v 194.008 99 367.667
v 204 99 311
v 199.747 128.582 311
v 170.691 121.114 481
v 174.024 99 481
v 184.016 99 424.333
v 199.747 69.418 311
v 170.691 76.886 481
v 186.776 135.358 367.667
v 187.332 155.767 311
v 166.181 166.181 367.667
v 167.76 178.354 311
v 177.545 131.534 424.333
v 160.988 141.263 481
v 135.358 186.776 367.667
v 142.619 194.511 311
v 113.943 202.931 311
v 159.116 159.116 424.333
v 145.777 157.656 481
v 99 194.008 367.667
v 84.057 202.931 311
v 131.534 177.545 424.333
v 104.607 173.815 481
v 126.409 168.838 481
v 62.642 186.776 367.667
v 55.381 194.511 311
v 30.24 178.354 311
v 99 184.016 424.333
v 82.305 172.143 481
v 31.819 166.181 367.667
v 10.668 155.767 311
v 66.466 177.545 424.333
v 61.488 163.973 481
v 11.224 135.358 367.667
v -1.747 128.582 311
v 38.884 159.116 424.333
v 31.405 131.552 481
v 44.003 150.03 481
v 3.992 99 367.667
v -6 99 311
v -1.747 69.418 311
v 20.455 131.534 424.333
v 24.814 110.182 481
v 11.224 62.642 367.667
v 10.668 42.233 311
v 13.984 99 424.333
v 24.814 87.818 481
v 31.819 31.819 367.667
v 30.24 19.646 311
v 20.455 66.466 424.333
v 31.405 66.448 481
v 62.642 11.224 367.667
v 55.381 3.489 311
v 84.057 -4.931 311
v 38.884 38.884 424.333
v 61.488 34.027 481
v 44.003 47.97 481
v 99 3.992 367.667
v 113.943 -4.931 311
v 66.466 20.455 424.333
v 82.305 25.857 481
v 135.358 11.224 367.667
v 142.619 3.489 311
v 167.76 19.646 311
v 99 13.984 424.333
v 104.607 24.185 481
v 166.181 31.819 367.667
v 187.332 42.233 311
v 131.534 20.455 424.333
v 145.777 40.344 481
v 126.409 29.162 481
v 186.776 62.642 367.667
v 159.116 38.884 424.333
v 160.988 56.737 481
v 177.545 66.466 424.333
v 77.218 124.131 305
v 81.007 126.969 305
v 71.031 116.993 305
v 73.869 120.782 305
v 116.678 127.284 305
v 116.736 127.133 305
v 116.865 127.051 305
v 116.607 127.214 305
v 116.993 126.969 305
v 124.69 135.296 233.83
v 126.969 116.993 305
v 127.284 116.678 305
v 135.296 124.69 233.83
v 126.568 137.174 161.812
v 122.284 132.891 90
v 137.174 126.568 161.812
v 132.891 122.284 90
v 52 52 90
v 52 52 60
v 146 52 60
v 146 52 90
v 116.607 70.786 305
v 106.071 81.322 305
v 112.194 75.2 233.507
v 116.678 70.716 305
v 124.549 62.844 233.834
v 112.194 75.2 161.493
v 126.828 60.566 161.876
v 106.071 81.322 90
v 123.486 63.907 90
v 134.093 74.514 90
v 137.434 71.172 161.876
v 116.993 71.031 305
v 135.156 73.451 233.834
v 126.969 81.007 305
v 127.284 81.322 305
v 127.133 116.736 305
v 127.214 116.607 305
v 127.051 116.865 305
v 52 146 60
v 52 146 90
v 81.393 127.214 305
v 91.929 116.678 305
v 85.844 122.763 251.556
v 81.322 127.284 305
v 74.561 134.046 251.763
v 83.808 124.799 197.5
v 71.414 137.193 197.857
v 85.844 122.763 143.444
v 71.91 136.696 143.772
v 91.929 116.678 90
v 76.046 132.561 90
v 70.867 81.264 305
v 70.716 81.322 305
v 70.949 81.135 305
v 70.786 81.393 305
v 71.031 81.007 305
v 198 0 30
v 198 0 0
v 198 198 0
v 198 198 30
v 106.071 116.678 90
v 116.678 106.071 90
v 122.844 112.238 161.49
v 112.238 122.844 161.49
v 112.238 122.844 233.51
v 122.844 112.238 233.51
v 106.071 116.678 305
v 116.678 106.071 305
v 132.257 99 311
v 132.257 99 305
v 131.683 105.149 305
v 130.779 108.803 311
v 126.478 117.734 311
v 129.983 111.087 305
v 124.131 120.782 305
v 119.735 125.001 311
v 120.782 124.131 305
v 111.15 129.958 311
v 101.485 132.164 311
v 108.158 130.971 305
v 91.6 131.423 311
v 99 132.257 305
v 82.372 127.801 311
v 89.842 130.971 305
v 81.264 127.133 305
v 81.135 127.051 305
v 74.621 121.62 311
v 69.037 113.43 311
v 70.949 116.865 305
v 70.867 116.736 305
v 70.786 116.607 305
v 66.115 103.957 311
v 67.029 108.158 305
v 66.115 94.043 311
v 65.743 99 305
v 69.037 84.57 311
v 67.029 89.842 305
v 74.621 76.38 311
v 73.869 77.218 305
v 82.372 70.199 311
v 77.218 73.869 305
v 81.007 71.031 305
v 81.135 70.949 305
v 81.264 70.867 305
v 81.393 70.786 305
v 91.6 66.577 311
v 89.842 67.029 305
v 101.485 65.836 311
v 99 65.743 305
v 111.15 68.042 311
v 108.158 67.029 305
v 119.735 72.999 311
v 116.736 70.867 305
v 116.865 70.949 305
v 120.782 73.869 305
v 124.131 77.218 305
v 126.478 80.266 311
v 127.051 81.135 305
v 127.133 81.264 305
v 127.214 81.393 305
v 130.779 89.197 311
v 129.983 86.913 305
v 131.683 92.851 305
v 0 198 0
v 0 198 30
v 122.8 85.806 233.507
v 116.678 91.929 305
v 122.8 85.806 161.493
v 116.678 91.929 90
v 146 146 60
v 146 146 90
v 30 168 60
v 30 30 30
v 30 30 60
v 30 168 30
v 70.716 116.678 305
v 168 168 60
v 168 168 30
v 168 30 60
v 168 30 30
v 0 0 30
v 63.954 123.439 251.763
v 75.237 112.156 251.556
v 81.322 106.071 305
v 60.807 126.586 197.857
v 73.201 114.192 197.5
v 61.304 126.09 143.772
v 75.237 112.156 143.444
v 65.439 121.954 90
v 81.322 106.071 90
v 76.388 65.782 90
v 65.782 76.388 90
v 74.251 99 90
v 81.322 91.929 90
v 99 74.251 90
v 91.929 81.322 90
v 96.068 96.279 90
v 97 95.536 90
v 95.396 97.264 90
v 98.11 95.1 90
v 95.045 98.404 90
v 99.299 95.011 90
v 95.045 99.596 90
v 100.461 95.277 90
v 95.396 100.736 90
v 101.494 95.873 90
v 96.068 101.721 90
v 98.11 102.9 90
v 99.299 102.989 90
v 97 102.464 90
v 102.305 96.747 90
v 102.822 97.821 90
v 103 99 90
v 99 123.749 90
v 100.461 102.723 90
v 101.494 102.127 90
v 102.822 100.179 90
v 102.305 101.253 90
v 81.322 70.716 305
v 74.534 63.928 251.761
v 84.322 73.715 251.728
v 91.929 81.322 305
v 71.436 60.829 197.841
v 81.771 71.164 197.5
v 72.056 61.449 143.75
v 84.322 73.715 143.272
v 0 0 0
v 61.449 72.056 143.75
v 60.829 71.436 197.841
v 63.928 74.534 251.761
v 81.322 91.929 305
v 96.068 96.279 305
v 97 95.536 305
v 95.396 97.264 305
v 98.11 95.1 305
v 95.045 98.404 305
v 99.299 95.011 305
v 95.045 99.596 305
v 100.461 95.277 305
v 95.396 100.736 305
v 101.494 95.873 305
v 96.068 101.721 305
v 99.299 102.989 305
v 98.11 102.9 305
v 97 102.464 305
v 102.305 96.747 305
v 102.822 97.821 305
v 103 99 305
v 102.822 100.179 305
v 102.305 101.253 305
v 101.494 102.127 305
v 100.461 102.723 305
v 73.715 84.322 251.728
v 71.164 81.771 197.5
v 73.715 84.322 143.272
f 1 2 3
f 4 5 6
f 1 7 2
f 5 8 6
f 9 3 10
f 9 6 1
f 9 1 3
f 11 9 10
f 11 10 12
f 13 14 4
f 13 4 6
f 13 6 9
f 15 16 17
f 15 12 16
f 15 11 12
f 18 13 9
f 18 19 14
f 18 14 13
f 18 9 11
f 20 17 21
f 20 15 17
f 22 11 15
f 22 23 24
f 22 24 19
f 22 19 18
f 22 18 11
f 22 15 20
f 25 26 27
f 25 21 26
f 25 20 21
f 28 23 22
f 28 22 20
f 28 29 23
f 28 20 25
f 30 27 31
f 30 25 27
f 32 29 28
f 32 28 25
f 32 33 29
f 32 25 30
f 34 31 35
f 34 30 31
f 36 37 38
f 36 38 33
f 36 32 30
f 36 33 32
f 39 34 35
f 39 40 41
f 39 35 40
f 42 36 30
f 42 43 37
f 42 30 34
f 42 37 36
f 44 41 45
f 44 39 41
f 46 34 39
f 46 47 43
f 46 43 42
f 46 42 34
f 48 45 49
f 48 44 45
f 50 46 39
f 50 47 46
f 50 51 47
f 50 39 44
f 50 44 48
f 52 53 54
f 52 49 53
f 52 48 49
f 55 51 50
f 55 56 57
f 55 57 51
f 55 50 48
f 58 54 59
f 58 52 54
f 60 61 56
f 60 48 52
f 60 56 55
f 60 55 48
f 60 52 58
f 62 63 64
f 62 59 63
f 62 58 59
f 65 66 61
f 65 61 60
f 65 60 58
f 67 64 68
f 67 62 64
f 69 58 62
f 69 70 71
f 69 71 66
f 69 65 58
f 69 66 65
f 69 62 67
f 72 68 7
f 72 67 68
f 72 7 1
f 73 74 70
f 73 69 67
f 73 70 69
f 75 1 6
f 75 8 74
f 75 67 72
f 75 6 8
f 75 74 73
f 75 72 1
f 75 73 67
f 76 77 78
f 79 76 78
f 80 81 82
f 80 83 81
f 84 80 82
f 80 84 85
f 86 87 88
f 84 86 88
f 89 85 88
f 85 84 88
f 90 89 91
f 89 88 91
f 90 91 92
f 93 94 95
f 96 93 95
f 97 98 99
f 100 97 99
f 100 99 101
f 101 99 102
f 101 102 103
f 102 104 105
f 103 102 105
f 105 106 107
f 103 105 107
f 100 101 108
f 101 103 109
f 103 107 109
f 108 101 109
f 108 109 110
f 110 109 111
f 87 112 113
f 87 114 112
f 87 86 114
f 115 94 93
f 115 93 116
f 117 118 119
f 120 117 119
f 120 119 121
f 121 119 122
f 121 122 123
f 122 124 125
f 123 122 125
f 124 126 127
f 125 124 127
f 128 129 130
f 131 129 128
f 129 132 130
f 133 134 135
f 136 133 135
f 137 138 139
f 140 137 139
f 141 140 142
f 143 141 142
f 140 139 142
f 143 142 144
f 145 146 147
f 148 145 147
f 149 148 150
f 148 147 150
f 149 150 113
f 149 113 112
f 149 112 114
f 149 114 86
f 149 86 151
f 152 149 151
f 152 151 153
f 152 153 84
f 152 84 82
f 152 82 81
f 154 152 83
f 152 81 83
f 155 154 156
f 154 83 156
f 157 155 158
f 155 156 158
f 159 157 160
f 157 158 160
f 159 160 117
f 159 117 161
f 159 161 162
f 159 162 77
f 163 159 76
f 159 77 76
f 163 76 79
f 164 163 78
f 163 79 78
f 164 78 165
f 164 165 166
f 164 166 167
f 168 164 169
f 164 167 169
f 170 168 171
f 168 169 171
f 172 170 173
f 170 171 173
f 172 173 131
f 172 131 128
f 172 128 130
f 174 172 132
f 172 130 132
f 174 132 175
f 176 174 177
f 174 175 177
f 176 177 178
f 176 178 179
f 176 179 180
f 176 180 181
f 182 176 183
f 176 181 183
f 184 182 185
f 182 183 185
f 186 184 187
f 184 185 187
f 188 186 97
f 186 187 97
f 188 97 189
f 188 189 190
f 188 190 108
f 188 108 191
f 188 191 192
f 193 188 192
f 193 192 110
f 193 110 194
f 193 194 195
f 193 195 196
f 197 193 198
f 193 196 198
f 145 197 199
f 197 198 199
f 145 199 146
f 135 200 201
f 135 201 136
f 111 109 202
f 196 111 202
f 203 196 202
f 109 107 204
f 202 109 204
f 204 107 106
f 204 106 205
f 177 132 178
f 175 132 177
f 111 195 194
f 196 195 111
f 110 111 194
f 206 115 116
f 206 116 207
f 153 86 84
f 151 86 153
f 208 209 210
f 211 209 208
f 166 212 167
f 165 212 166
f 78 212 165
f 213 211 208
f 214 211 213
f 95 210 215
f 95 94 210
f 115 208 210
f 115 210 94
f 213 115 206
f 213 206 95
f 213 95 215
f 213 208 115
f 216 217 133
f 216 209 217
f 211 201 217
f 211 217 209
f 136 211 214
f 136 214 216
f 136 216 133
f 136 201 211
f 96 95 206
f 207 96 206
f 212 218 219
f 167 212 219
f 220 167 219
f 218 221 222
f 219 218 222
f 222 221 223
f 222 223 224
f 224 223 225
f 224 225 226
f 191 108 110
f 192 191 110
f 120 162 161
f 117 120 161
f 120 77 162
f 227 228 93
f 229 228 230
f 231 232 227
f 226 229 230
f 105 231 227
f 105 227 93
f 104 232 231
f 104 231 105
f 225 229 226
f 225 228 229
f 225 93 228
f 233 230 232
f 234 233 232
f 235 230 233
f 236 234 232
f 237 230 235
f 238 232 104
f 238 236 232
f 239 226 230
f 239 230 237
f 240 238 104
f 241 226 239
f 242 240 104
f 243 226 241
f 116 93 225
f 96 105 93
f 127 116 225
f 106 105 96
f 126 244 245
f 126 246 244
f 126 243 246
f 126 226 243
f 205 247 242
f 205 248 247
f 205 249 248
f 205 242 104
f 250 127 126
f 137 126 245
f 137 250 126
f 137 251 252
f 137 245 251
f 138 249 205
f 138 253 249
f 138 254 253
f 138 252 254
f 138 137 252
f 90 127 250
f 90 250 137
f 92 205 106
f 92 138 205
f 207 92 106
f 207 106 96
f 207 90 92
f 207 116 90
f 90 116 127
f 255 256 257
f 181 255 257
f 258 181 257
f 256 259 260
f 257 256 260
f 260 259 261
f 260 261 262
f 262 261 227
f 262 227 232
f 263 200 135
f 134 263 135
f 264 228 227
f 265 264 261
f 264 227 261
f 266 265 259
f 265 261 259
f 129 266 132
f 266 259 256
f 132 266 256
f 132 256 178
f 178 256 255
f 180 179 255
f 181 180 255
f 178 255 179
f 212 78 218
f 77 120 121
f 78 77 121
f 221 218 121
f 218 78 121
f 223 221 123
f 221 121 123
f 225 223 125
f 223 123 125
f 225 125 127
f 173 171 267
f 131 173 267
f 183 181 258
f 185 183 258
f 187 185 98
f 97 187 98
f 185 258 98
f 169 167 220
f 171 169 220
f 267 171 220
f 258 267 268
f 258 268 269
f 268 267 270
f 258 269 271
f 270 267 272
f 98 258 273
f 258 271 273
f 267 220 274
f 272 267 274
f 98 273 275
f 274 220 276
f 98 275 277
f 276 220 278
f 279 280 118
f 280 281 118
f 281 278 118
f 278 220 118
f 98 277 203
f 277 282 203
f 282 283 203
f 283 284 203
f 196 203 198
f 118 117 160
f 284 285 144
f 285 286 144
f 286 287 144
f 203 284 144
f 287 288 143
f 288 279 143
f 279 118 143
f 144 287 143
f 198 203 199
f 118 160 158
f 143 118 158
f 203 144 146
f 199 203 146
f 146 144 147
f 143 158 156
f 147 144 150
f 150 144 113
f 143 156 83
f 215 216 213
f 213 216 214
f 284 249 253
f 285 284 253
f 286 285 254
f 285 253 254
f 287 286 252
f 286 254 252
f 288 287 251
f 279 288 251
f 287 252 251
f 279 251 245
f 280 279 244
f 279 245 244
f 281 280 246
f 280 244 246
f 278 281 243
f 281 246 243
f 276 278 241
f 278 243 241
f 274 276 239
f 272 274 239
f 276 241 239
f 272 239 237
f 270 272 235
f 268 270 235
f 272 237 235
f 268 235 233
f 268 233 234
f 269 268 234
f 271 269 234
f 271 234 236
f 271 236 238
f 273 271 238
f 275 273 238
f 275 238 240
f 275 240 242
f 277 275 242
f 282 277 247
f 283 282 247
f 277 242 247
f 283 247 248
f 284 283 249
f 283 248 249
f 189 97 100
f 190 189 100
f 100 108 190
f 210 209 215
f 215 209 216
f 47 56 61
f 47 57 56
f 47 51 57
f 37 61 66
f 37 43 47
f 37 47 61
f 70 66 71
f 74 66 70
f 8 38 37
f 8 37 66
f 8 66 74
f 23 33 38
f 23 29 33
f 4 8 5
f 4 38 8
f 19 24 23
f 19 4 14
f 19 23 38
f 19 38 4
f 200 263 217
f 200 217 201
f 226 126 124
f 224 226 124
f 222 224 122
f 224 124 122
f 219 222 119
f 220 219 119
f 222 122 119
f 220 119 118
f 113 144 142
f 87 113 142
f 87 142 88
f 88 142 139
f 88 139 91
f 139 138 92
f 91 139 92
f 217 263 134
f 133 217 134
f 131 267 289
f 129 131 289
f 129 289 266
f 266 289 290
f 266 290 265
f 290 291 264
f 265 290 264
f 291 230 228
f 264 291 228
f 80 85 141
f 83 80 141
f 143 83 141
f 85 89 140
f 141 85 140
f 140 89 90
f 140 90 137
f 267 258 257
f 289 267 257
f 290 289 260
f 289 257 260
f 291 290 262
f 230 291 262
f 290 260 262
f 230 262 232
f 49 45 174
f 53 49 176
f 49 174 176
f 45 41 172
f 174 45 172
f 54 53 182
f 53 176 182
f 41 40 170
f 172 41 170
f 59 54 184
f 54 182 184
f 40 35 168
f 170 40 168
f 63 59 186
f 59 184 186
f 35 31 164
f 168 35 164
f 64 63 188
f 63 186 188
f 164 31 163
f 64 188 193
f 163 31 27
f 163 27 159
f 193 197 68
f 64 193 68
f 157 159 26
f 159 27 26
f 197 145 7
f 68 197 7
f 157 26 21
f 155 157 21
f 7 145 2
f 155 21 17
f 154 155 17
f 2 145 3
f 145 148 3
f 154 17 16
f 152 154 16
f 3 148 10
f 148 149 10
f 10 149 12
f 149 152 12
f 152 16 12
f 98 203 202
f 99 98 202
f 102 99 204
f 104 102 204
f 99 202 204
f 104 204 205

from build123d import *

# Parameters (mm, degrees)
F0_W      = 198
F0_H      = 198
F1_DEPTH  = 30
F2_W      = 138
F2_H      = 138
F3_DEPTH  = 30
F4_W      = 94
F4_H      = 94
F5_DEPTH  = 30
F6_R      = 4
F7_DEPTH  = 215
F9_DEPTH  = 215
F11_DEPTH = 25
F13_DEPTH = 25
F15_DEPTH = 25
F17_DEPTH = 25
F18_R     = 33.2568147927
F19_DEPTH = 6
F20_R     = 105
F20_R_2   = 33.2568147927
F21_DEPTH = 170
F21_TAPER = 10


with BuildPart() as f1:
    # F0 (on Top) → F1 (new body)
    with BuildSketch(Plane.XY):
        with Locations((99, 99)):
            Rectangle(F0_W, F0_H)
    extrude(amount=F1_DEPTH)

    # F2 (on face) → F3 (join)
    with BuildSketch(Plane.XY.offset(30)):
        with Locations((99, 99)):
            Rectangle(F2_W, F2_H)
    extrude(amount=F3_DEPTH)

    # F4 (on face) → F5 (join)
    with BuildSketch(Plane.XY.offset(60)):
        with Locations((99, 99)):
            Rectangle(F4_W, F4_H)
    extrude(amount=F5_DEPTH)

    # F6 (on face) → F7 (join)
    with BuildSketch(Plane.XY.offset(90)):
        with Locations((99, 99)):
            Circle(F6_R)
    extrude(amount=F7_DEPTH)

    # F8 (on face) → F9 (join)
    with BuildSketch(Plane.XY.offset(90)):
        Polygon((86.6256313292, 111.3743686708), (65.4124278936, 132.5875721064), (60.1091270347, 127.2842712475), (81.3223304703, 106.0710678119), align=None)
        Polygon((70.7157287525, 137.8908729653), (65.4124278936, 132.5875721064), (86.6256313292, 111.3743686708), (91.9289321881, 116.6776695297), align=None)
        Polygon((127.2842712475, 137.8908729653), (106.0710678119, 116.6776695297), (111.3743686708, 111.3743686708), (132.5875721064, 132.5875721064), align=None)
        Polygon((132.5875721064, 132.5875721064), (111.3743686708, 111.3743686708), (116.6776695297, 106.0710678119), (137.8908729653, 127.2842712475), align=None)
        Polygon((137.8908729653, 70.7157287525), (116.6776695297, 91.9289321881), (111.3743686708, 86.6256313292), (132.5875721064, 65.4124278936), align=None)
        Polygon((111.3743686708, 86.6256313292), (106.0710678119, 81.3223304703), (127.2842712475, 60.1091270347), (132.5875721064, 65.4124278936), align=None)
        Polygon((91.9289321881, 81.3223304703), (86.6256313292, 86.6256313292), (65.4124278936, 65.4124278936), (70.7157287525, 60.1091270347), align=None)
        Polygon((86.6256313292, 86.6256313292), (81.3223304703, 91.9289321881), (60.1091270347, 70.7157287525), (65.4124278936, 65.4124278936), align=None)
    extrude(amount=F9_DEPTH)

    # F10 (on face) → F11 (cut)
    with BuildSketch(Plane(origin=(5.3033008589, -5.3033008589, 0), x_dir=(0.7071067812, 0.7071067812, 0), z_dir=(0.7071067812, -0.7071067812, 0))):
        with BuildLine():
            Line((122.5071426749, 90), (122.5071426749, 305))
            ThreePointArc((122.5071426749, 305), (108.1413524776, 197.5), (122.5071426749, 90))
        make_face()
        with BuildLine():
            ThreePointArc((100.5295589566, 90), (93.5255146575, 197.840533222), (107.5071426749, 305))
            Line((107.5071426749, 305), (92.5071426749, 305))
            Line((92.5071426749, 305), (92.5071426749, 90))
            Line((92.5071426749, 90), (100.5295589566, 90))
        make_face()
    extrude(amount=-F11_DEPTH, mode=Mode.SUBTRACT)

    # F12 (on face) → F13 (cut)
    with BuildSketch(Plane(origin=(104.3033008589, 104.3033008589, 0), x_dir=(-0.7071067812, 0.7071067812, 0), z_dir=(0.7071067812, 0.7071067812, 0))):
        with BuildLine():
            Line((17.5, 305), (17.5, 90))
            ThreePointArc((17.5, 90), (28.9852035419, 197.5), (17.5, 305))
        make_face()
        with BuildLine():
            ThreePointArc((32.5, 305), (46.5125090054, 197.8568495491), (39.962310344, 90))
            Line((39.962310344, 90), (47.5, 90))
            Line((47.5, 90), (47.5, 305))
            Line((47.5, 305), (32.5, 305))
        make_face()
    extrude(amount=-F13_DEPTH, mode=Mode.SUBTRACT)

    # F14 (on face) → F15 (cut)
    with BuildSketch(Plane(origin=(5.3033008589, -5.3033008589, 0), x_dir=(0.7071067812, 0.7071067812, 0), z_dir=(0.7071067812, -0.7071067812, 0))):
        with BuildLine():
            ThreePointArc((172.5071426749, 305), (186.2558070406, 197.8608173435), (180.4356426001, 90))
            Line((180.4356426001, 90), (187.5071426749, 90))
            Line((187.5071426749, 90), (187.5071426749, 305))
            Line((187.5071426749, 305), (172.5071426749, 305))
        make_face()
        with BuildLine():
            Line((157.5071426749, 305), (157.5071426749, 90))
            ThreePointArc((157.5071426749, 90), (167.3211795092, 197.5), (157.5071426749, 305))
        make_face()
    extrude(amount=-F15_DEPTH, mode=Mode.SUBTRACT)

    # F16 (on face) → F17 (cut)
    with BuildSketch(Plane(origin=(104.3033008589, 104.3033008589, 0), x_dir=(-0.7071067812, 0.7071067812, 0), z_dir=(0.7071067812, 0.7071067812, 0))):
        with BuildLine():
            ThreePointArc((-42.129099369, 90), (-46.2365441061, 197.8995849807), (-32.5, 305))
            Line((-32.5, 305), (-47.5, 305))
            Line((-47.5, 305), (-47.5, 90))
            Line((-47.5, 90), (-42.129099369, 90))
        make_face()
        with BuildLine():
            Line((-17.5, 90), (-17.5, 305))
            ThreePointArc((-17.5, 305), (-27.2443014962, 197.5), (-17.5, 90))
        make_face()
    extrude(amount=-F17_DEPTH, mode=Mode.SUBTRACT)

    # F18 (on face) → F19 (join)
    with BuildSketch(Plane.XY.offset(305)):
        with Locations((99, 99)):
            Circle(F18_R)
    extrude(amount=F19_DEPTH)

    # F20 (on face) → F21 (join)
    with BuildSketch(Plane.XY.offset(311)):
        with Locations((99, 99)):
            Circle(F20_R)
        with Locations((99, 99)):
            Circle(F20_R_2, mode=Mode.SUBTRACT)
        with Locations((99, 99)):
            Circle(F20_R_2)
    extrude(amount=F21_DEPTH, taper=F21_TAPER)


solid = f1.part
